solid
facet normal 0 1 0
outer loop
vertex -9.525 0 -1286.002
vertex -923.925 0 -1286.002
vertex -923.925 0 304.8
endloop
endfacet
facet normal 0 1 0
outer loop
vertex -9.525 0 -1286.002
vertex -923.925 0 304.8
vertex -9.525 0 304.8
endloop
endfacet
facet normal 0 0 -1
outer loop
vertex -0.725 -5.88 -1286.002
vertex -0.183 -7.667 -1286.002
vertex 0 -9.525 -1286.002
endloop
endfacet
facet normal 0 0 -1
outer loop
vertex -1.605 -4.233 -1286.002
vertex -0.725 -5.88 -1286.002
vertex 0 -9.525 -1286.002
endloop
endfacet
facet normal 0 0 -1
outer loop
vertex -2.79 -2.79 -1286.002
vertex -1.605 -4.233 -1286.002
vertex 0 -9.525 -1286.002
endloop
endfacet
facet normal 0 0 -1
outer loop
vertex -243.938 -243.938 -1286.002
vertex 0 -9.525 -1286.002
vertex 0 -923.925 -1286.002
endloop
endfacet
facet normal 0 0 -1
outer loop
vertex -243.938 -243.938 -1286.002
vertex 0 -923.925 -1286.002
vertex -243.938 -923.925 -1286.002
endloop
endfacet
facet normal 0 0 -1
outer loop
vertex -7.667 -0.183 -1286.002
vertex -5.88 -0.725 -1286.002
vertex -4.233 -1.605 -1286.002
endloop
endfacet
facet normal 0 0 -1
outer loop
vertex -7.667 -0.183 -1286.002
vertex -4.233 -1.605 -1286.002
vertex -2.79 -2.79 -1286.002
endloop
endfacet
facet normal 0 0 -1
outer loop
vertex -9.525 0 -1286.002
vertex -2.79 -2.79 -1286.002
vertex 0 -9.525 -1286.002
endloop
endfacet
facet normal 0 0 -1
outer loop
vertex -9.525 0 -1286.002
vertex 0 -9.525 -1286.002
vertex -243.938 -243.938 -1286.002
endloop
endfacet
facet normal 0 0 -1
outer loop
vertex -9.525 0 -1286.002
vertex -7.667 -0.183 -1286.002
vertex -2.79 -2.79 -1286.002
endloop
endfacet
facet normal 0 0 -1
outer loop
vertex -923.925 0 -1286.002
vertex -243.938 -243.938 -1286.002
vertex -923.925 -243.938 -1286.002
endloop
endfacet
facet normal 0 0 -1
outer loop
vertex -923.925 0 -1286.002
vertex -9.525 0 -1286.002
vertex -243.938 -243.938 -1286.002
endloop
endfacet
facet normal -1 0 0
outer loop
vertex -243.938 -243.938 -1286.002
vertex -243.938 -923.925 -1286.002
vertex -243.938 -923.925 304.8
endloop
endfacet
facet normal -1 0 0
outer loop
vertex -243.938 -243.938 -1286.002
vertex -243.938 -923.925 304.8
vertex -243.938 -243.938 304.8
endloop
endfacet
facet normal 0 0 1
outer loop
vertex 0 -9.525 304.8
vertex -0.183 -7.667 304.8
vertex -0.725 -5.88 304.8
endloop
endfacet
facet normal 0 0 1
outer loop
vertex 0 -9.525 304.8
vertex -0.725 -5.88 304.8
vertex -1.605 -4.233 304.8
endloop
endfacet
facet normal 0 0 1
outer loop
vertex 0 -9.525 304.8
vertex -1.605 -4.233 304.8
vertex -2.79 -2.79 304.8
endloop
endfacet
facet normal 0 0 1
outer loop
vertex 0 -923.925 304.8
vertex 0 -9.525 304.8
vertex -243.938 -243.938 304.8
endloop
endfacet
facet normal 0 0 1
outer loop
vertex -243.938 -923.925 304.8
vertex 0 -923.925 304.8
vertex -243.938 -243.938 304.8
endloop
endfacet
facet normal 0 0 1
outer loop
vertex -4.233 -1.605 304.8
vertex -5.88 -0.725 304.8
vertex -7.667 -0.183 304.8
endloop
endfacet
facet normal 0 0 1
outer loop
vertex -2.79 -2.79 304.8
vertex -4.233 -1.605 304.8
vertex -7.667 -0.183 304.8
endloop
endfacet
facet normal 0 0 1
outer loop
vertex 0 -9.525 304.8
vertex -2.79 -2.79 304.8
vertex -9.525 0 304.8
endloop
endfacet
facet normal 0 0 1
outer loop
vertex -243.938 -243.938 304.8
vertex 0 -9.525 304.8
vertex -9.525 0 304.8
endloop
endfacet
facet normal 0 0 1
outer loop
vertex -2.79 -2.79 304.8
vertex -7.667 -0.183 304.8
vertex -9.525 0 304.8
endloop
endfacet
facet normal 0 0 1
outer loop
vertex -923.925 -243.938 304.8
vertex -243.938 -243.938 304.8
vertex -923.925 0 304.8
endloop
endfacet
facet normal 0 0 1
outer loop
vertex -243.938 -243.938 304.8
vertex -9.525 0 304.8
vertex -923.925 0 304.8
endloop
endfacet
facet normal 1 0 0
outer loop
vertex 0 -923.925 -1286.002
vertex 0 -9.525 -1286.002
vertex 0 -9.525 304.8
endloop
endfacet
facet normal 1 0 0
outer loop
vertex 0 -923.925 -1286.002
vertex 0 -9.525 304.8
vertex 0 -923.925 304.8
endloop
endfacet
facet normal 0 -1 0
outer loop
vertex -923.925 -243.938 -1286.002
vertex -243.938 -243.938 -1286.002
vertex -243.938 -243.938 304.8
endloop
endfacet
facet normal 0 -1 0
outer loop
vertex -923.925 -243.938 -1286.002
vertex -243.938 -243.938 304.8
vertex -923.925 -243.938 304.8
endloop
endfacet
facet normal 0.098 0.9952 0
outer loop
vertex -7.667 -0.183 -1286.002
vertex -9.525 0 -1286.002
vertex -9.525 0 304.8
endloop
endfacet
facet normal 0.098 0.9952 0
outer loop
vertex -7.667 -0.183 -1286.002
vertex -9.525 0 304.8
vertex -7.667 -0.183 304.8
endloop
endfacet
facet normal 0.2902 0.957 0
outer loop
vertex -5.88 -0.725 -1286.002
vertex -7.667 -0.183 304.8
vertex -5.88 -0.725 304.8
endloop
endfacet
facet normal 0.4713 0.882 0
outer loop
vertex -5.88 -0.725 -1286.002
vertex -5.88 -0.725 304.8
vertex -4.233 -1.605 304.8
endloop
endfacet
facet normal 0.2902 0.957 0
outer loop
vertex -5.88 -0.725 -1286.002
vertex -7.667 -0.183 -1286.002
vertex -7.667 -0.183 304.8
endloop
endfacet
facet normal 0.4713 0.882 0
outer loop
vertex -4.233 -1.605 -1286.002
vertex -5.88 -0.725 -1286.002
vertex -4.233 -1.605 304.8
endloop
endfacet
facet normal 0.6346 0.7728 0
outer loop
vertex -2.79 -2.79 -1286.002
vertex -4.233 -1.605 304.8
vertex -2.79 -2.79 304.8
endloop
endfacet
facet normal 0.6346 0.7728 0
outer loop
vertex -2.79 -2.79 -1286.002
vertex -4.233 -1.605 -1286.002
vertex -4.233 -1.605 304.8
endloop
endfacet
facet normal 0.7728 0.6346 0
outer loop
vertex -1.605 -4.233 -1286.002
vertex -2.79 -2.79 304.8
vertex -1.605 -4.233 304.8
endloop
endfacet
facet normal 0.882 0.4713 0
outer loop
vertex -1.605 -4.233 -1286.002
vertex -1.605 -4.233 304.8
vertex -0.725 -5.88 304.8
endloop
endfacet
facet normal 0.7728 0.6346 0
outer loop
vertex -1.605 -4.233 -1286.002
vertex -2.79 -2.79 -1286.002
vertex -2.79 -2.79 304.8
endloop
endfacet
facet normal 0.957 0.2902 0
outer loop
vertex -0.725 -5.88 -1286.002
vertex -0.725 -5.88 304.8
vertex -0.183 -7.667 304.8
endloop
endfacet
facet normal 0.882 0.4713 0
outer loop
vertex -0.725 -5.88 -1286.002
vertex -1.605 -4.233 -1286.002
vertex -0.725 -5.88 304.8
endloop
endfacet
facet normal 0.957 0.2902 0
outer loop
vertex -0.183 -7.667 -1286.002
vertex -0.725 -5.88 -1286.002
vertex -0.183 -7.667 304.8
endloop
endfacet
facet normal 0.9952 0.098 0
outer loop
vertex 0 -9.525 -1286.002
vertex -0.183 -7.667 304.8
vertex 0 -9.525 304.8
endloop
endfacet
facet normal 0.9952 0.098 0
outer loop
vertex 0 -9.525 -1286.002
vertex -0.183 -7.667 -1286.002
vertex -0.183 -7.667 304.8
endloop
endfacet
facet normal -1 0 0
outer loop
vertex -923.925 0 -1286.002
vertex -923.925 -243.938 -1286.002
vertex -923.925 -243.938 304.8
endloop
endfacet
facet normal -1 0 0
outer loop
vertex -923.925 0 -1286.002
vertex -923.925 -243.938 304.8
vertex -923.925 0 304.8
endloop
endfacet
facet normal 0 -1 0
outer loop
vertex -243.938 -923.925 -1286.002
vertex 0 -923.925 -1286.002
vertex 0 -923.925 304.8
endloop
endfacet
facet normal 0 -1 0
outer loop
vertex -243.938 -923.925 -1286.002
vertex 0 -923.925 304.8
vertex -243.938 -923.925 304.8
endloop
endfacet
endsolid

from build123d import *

# Parameters (mm, degrees)
BOSS_EXTRUDE2_DEPTH      = 304.8
BOSS_EXTRUDE2_DEPTH_BACK = 1286.002


with BuildPart() as part:
    # Sketch1 → Boss-Extrude2 (new, two sides: drawn at the far end of the back side and taken through both)
    with BuildSketch(Plane.XY.offset(-BOSS_EXTRUDE2_DEPTH_BACK)):
        with BuildLine():
            Line((0, -9.525), (0, -923.925))
            Line((0, -923.925), (-243.93812726, -923.925))
            Line((-243.93812726, -923.925), (-243.93812726, -243.93812726))
            Line((-243.93812726, -243.93812726), (-923.925, -243.93812726))
            Line((-923.925, -243.93812726), (-923.925, 0))
            Line((-923.925, 0), (-9.525, 0))
            ThreePointArc((-9.525, 0), (-2.789807909, -2.789807909), (0, -9.525))
        make_face()
    extrude(amount=BOSS_EXTRUDE2_DEPTH + BOSS_EXTRUDE2_DEPTH_BACK)


solid = part.part
